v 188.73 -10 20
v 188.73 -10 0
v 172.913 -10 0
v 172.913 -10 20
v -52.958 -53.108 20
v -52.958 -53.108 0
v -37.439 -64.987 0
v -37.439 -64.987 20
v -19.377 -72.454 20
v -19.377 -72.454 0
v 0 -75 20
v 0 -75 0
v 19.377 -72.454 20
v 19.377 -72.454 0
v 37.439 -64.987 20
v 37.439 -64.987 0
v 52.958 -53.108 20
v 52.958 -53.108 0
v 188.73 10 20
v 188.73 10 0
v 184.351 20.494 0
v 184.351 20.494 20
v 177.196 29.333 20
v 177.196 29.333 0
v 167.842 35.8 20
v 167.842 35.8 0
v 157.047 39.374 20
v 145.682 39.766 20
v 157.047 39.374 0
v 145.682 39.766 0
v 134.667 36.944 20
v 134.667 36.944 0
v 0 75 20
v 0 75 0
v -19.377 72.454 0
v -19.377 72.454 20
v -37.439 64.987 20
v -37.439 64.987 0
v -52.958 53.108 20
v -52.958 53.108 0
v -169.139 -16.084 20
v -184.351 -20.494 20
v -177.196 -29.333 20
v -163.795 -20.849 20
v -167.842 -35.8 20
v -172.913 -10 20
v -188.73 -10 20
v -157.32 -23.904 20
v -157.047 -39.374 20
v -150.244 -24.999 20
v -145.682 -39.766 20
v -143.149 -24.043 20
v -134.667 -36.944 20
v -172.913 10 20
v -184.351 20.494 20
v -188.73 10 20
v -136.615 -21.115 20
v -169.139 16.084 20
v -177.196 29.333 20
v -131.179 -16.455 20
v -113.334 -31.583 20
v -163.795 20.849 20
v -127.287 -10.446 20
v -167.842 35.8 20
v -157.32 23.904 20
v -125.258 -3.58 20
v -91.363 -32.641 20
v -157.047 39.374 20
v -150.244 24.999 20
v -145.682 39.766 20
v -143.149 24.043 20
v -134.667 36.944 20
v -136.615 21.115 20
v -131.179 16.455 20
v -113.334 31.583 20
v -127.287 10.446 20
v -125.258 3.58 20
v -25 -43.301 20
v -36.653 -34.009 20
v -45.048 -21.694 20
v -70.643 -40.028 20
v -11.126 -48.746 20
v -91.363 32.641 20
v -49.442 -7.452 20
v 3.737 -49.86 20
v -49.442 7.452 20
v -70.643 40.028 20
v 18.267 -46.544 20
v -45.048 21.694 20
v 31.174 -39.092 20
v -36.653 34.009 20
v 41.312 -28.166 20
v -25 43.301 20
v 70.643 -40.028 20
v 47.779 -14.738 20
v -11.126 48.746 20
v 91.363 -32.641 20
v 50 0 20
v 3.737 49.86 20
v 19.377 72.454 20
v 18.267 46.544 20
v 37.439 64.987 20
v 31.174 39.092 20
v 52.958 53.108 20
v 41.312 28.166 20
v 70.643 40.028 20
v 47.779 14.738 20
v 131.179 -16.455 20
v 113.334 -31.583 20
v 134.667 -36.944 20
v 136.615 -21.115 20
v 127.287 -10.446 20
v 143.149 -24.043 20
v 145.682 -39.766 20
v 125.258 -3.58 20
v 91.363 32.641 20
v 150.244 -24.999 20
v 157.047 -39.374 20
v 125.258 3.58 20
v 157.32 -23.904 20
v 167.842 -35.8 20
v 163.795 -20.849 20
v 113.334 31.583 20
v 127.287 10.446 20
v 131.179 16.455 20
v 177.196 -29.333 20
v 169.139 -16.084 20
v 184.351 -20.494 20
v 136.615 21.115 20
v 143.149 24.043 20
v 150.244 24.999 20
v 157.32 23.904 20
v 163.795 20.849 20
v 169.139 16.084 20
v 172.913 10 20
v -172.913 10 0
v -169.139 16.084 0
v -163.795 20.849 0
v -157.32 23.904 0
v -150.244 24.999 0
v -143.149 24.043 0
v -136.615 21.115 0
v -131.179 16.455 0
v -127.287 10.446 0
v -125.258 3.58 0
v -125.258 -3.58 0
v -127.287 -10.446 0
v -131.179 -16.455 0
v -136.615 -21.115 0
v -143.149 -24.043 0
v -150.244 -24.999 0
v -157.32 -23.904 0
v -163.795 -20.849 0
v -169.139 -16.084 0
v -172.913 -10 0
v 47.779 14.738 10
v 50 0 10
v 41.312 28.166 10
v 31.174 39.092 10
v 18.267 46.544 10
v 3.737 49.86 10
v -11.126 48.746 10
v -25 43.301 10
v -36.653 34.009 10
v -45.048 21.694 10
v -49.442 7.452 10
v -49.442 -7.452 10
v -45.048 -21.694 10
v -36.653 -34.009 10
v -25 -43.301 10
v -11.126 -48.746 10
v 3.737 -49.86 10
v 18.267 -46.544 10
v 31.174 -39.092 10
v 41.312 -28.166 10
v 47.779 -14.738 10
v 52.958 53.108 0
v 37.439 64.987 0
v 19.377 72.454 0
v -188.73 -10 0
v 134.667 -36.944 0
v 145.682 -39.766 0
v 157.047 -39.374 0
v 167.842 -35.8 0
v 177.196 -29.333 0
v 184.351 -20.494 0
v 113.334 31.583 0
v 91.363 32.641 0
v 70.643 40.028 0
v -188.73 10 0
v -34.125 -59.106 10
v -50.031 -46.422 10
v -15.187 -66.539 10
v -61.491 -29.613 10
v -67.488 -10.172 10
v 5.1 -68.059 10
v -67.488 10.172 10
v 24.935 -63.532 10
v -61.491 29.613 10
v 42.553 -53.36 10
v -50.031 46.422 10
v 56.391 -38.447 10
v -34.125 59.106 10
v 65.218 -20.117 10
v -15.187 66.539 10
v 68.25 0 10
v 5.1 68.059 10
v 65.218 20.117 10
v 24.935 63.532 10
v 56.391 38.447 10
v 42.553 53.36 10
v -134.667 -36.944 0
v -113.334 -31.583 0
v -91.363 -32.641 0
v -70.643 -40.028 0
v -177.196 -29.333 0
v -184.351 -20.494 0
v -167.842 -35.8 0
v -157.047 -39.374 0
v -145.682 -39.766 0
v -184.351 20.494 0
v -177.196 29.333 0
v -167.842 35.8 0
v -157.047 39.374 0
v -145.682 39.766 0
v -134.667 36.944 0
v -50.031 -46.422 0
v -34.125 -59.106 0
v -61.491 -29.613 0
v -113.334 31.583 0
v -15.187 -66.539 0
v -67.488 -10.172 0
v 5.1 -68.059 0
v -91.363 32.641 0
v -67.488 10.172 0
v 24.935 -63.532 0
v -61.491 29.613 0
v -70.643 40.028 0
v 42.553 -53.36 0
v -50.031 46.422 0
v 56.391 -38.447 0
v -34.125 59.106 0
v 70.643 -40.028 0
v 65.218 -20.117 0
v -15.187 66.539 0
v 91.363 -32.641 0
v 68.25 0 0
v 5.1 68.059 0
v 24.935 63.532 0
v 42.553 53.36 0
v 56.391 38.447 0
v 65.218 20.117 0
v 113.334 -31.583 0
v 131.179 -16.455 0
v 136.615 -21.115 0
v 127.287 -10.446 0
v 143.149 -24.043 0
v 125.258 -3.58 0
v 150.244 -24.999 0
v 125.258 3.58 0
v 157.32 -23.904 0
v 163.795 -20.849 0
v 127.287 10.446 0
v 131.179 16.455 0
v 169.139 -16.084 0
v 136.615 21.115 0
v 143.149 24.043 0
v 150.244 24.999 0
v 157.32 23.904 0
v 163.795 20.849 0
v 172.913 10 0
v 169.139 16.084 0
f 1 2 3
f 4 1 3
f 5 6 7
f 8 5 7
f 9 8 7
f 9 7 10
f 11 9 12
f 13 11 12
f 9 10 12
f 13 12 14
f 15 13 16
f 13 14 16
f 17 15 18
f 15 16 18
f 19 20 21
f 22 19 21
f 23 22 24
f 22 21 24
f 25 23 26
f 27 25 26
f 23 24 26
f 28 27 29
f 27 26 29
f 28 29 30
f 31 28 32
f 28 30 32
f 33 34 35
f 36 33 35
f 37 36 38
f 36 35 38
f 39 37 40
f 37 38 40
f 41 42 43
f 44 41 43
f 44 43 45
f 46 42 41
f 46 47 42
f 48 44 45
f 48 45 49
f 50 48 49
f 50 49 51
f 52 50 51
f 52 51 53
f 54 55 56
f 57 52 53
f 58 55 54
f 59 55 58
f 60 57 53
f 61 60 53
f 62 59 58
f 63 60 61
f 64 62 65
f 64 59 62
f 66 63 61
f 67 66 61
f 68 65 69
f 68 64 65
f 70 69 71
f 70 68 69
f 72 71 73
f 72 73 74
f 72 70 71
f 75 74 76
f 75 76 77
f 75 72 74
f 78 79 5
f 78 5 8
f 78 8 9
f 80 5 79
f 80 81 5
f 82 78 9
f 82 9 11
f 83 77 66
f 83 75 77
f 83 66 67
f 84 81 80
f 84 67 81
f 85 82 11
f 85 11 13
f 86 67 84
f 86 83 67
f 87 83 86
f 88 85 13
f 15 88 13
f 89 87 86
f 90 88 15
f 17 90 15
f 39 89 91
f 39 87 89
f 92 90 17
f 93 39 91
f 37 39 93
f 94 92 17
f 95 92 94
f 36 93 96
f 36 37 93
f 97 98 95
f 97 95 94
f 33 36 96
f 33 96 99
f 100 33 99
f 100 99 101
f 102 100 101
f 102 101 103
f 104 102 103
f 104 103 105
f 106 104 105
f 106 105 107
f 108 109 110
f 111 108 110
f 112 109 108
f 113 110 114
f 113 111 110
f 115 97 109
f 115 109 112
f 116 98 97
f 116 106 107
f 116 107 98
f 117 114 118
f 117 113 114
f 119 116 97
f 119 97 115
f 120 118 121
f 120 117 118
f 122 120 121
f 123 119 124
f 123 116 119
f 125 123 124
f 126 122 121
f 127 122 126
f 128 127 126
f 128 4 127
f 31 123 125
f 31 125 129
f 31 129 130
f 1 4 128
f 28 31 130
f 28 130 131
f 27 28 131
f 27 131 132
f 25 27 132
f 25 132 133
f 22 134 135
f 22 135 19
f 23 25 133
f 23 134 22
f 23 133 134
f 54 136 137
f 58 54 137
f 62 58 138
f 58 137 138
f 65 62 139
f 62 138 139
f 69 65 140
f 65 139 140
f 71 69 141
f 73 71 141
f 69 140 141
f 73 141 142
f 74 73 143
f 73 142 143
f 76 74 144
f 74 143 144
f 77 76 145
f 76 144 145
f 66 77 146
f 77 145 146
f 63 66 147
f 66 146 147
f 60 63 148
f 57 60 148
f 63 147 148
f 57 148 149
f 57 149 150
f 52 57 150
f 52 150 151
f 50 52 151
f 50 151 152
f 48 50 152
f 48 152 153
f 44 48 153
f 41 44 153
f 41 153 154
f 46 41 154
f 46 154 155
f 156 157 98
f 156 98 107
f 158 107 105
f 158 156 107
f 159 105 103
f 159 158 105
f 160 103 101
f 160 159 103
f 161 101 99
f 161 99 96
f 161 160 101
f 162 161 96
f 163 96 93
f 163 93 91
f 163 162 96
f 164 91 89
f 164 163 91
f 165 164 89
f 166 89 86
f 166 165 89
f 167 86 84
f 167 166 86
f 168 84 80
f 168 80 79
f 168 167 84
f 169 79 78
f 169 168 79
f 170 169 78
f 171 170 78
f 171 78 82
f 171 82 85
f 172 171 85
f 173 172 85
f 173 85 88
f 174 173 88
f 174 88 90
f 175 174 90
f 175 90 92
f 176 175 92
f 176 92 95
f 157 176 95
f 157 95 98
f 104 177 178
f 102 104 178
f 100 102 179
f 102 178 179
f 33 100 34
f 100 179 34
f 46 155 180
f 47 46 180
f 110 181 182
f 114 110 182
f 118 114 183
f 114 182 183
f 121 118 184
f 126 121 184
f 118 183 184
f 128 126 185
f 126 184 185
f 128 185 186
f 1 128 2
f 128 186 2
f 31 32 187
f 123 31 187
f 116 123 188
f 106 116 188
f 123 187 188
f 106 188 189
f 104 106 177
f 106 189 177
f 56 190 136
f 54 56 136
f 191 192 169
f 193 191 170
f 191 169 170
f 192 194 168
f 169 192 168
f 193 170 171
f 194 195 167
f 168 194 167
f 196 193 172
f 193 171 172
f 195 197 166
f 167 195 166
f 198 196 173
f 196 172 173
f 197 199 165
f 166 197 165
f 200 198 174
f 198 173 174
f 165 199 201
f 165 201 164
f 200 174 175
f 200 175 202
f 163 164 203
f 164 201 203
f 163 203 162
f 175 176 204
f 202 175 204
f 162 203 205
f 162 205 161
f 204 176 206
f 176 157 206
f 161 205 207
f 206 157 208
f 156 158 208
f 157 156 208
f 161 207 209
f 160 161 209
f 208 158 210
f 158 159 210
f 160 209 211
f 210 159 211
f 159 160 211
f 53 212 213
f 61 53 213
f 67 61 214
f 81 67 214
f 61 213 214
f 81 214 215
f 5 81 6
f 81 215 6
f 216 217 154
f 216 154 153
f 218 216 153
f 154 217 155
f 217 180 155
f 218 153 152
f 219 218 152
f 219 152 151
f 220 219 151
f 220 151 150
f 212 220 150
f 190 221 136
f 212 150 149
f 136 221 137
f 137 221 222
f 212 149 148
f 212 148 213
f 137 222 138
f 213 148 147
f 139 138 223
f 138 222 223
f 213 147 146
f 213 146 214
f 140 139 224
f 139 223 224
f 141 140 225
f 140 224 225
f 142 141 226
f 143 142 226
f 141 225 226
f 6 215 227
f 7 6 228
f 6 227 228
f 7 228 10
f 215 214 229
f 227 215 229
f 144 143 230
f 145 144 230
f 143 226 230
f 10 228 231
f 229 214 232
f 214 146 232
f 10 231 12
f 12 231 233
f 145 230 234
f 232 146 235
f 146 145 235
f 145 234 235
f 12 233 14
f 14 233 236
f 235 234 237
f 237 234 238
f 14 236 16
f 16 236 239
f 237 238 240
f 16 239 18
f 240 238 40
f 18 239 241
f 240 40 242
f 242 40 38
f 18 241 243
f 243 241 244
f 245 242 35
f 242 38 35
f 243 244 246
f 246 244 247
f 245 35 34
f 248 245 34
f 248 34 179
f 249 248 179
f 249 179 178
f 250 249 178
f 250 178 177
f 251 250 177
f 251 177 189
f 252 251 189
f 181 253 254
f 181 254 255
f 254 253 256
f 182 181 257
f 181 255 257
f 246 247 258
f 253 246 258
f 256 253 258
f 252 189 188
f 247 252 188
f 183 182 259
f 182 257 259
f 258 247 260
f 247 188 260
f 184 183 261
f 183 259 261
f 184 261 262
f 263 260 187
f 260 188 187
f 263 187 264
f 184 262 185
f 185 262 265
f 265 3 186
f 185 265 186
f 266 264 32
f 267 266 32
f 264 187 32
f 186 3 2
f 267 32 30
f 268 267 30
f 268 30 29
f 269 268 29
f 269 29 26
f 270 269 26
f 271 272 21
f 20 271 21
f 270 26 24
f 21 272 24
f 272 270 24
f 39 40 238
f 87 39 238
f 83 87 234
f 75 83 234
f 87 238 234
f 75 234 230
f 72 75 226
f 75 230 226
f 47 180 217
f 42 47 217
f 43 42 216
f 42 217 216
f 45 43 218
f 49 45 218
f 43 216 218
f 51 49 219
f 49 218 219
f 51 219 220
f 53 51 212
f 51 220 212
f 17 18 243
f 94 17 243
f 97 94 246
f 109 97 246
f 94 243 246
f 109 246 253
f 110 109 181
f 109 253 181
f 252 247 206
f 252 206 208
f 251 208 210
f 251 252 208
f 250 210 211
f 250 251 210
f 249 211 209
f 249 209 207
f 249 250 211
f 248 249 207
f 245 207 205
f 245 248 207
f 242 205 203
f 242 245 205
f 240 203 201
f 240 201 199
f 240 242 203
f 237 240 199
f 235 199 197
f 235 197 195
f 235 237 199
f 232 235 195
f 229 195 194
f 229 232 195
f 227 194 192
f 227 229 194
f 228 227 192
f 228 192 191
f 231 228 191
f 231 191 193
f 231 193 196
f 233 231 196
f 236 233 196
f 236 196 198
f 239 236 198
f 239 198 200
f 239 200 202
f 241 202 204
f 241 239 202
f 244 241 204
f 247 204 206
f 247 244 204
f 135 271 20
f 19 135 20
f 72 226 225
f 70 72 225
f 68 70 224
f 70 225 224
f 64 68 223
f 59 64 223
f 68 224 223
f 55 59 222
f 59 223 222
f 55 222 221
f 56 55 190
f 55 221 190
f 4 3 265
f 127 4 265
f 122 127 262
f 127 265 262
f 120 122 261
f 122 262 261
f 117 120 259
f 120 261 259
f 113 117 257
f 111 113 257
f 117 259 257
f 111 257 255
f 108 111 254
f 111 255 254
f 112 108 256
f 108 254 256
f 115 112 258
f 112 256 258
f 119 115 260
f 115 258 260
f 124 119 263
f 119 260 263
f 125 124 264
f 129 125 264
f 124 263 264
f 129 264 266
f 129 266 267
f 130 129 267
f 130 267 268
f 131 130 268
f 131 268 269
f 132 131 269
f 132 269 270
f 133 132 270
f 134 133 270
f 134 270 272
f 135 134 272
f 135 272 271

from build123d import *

# Parameters (mm, degrees)
ESQUISSE1_R             = 50
BOSS_EXTRU_3_DEPTH      = 20
ESQUISSE2_R             = 68.25
ENL_V_MAT_EXTRU_9_DEPTH = 10


with BuildPart() as part:
    # Esquisse1 → Boss.-Extru.3 (new body)
    with BuildSketch(Plane.XY):
        with BuildLine():
            ThreePointArc((52.958333333, 53.107578843), (28.652500648, 69.311140566), (0, 75))
            ThreePointArc((0, 75), (-28.652500648, 69.311140566), (-52.958333333, 53.107578843))
            ThreePointArc((-52.958333333, 53.107578843), (-91.362529225, 32.640861336), (-134.666666667, 36.944402673))
            ThreePointArc((-134.666666667, 36.944402673), (-167.842344673, 35.800149952), (-188.729833462, 10))
            Line((-188.729833462, 10), (-172.912878475, 10))
            ThreePointArc((-172.912878475, 10), (-125, 0), (-172.912878475, -10))
            Line((-172.912878475, -10), (-188.729833462, -10))
            ThreePointArc((-188.729833462, -10), (-167.842344673, -35.800149952), (-134.666666667, -36.944402673))
            ThreePointArc((-134.666666667, -36.944402673), (-91.362529225, -32.640861336), (-52.958333333, -53.107578843))
            ThreePointArc((-52.958333333, -53.107578843), (0, -75), (52.958333333, -53.107578843))
            ThreePointArc((52.958333333, -53.107578843), (91.362529225, -32.640861336), (134.666666667, -36.944402673))
            ThreePointArc((134.666666667, -36.944402673), (167.842344673, -35.800149952), (188.729833462, -10))
            Line((188.729833462, -10), (172.912878475, -10))
            ThreePointArc((172.912878475, -10), (125, 0), (172.912878475, 10))
            Line((172.912878475, 10), (188.729833462, 10))
            ThreePointArc((188.729833462, 10), (167.842344673, 35.800149952), (134.666666667, 36.944402673))
            ThreePointArc((134.666666667, 36.944402673), (91.362529225, 32.640861336), (52.958333333, 53.107578843))
        make_face()
        Circle(ESQUISSE1_R, mode=Mode.SUBTRACT)
    extrude(amount=BOSS_EXTRU_3_DEPTH)

    # Esquisse2 → Enlèv. mat.-Extru.9 (cut)
    with BuildSketch(Plane.XY):
        Circle(ESQUISSE2_R)
    extrude(amount=ENL_V_MAT_EXTRU_9_DEPTH, mode=Mode.SUBTRACT)


solid = part.part
